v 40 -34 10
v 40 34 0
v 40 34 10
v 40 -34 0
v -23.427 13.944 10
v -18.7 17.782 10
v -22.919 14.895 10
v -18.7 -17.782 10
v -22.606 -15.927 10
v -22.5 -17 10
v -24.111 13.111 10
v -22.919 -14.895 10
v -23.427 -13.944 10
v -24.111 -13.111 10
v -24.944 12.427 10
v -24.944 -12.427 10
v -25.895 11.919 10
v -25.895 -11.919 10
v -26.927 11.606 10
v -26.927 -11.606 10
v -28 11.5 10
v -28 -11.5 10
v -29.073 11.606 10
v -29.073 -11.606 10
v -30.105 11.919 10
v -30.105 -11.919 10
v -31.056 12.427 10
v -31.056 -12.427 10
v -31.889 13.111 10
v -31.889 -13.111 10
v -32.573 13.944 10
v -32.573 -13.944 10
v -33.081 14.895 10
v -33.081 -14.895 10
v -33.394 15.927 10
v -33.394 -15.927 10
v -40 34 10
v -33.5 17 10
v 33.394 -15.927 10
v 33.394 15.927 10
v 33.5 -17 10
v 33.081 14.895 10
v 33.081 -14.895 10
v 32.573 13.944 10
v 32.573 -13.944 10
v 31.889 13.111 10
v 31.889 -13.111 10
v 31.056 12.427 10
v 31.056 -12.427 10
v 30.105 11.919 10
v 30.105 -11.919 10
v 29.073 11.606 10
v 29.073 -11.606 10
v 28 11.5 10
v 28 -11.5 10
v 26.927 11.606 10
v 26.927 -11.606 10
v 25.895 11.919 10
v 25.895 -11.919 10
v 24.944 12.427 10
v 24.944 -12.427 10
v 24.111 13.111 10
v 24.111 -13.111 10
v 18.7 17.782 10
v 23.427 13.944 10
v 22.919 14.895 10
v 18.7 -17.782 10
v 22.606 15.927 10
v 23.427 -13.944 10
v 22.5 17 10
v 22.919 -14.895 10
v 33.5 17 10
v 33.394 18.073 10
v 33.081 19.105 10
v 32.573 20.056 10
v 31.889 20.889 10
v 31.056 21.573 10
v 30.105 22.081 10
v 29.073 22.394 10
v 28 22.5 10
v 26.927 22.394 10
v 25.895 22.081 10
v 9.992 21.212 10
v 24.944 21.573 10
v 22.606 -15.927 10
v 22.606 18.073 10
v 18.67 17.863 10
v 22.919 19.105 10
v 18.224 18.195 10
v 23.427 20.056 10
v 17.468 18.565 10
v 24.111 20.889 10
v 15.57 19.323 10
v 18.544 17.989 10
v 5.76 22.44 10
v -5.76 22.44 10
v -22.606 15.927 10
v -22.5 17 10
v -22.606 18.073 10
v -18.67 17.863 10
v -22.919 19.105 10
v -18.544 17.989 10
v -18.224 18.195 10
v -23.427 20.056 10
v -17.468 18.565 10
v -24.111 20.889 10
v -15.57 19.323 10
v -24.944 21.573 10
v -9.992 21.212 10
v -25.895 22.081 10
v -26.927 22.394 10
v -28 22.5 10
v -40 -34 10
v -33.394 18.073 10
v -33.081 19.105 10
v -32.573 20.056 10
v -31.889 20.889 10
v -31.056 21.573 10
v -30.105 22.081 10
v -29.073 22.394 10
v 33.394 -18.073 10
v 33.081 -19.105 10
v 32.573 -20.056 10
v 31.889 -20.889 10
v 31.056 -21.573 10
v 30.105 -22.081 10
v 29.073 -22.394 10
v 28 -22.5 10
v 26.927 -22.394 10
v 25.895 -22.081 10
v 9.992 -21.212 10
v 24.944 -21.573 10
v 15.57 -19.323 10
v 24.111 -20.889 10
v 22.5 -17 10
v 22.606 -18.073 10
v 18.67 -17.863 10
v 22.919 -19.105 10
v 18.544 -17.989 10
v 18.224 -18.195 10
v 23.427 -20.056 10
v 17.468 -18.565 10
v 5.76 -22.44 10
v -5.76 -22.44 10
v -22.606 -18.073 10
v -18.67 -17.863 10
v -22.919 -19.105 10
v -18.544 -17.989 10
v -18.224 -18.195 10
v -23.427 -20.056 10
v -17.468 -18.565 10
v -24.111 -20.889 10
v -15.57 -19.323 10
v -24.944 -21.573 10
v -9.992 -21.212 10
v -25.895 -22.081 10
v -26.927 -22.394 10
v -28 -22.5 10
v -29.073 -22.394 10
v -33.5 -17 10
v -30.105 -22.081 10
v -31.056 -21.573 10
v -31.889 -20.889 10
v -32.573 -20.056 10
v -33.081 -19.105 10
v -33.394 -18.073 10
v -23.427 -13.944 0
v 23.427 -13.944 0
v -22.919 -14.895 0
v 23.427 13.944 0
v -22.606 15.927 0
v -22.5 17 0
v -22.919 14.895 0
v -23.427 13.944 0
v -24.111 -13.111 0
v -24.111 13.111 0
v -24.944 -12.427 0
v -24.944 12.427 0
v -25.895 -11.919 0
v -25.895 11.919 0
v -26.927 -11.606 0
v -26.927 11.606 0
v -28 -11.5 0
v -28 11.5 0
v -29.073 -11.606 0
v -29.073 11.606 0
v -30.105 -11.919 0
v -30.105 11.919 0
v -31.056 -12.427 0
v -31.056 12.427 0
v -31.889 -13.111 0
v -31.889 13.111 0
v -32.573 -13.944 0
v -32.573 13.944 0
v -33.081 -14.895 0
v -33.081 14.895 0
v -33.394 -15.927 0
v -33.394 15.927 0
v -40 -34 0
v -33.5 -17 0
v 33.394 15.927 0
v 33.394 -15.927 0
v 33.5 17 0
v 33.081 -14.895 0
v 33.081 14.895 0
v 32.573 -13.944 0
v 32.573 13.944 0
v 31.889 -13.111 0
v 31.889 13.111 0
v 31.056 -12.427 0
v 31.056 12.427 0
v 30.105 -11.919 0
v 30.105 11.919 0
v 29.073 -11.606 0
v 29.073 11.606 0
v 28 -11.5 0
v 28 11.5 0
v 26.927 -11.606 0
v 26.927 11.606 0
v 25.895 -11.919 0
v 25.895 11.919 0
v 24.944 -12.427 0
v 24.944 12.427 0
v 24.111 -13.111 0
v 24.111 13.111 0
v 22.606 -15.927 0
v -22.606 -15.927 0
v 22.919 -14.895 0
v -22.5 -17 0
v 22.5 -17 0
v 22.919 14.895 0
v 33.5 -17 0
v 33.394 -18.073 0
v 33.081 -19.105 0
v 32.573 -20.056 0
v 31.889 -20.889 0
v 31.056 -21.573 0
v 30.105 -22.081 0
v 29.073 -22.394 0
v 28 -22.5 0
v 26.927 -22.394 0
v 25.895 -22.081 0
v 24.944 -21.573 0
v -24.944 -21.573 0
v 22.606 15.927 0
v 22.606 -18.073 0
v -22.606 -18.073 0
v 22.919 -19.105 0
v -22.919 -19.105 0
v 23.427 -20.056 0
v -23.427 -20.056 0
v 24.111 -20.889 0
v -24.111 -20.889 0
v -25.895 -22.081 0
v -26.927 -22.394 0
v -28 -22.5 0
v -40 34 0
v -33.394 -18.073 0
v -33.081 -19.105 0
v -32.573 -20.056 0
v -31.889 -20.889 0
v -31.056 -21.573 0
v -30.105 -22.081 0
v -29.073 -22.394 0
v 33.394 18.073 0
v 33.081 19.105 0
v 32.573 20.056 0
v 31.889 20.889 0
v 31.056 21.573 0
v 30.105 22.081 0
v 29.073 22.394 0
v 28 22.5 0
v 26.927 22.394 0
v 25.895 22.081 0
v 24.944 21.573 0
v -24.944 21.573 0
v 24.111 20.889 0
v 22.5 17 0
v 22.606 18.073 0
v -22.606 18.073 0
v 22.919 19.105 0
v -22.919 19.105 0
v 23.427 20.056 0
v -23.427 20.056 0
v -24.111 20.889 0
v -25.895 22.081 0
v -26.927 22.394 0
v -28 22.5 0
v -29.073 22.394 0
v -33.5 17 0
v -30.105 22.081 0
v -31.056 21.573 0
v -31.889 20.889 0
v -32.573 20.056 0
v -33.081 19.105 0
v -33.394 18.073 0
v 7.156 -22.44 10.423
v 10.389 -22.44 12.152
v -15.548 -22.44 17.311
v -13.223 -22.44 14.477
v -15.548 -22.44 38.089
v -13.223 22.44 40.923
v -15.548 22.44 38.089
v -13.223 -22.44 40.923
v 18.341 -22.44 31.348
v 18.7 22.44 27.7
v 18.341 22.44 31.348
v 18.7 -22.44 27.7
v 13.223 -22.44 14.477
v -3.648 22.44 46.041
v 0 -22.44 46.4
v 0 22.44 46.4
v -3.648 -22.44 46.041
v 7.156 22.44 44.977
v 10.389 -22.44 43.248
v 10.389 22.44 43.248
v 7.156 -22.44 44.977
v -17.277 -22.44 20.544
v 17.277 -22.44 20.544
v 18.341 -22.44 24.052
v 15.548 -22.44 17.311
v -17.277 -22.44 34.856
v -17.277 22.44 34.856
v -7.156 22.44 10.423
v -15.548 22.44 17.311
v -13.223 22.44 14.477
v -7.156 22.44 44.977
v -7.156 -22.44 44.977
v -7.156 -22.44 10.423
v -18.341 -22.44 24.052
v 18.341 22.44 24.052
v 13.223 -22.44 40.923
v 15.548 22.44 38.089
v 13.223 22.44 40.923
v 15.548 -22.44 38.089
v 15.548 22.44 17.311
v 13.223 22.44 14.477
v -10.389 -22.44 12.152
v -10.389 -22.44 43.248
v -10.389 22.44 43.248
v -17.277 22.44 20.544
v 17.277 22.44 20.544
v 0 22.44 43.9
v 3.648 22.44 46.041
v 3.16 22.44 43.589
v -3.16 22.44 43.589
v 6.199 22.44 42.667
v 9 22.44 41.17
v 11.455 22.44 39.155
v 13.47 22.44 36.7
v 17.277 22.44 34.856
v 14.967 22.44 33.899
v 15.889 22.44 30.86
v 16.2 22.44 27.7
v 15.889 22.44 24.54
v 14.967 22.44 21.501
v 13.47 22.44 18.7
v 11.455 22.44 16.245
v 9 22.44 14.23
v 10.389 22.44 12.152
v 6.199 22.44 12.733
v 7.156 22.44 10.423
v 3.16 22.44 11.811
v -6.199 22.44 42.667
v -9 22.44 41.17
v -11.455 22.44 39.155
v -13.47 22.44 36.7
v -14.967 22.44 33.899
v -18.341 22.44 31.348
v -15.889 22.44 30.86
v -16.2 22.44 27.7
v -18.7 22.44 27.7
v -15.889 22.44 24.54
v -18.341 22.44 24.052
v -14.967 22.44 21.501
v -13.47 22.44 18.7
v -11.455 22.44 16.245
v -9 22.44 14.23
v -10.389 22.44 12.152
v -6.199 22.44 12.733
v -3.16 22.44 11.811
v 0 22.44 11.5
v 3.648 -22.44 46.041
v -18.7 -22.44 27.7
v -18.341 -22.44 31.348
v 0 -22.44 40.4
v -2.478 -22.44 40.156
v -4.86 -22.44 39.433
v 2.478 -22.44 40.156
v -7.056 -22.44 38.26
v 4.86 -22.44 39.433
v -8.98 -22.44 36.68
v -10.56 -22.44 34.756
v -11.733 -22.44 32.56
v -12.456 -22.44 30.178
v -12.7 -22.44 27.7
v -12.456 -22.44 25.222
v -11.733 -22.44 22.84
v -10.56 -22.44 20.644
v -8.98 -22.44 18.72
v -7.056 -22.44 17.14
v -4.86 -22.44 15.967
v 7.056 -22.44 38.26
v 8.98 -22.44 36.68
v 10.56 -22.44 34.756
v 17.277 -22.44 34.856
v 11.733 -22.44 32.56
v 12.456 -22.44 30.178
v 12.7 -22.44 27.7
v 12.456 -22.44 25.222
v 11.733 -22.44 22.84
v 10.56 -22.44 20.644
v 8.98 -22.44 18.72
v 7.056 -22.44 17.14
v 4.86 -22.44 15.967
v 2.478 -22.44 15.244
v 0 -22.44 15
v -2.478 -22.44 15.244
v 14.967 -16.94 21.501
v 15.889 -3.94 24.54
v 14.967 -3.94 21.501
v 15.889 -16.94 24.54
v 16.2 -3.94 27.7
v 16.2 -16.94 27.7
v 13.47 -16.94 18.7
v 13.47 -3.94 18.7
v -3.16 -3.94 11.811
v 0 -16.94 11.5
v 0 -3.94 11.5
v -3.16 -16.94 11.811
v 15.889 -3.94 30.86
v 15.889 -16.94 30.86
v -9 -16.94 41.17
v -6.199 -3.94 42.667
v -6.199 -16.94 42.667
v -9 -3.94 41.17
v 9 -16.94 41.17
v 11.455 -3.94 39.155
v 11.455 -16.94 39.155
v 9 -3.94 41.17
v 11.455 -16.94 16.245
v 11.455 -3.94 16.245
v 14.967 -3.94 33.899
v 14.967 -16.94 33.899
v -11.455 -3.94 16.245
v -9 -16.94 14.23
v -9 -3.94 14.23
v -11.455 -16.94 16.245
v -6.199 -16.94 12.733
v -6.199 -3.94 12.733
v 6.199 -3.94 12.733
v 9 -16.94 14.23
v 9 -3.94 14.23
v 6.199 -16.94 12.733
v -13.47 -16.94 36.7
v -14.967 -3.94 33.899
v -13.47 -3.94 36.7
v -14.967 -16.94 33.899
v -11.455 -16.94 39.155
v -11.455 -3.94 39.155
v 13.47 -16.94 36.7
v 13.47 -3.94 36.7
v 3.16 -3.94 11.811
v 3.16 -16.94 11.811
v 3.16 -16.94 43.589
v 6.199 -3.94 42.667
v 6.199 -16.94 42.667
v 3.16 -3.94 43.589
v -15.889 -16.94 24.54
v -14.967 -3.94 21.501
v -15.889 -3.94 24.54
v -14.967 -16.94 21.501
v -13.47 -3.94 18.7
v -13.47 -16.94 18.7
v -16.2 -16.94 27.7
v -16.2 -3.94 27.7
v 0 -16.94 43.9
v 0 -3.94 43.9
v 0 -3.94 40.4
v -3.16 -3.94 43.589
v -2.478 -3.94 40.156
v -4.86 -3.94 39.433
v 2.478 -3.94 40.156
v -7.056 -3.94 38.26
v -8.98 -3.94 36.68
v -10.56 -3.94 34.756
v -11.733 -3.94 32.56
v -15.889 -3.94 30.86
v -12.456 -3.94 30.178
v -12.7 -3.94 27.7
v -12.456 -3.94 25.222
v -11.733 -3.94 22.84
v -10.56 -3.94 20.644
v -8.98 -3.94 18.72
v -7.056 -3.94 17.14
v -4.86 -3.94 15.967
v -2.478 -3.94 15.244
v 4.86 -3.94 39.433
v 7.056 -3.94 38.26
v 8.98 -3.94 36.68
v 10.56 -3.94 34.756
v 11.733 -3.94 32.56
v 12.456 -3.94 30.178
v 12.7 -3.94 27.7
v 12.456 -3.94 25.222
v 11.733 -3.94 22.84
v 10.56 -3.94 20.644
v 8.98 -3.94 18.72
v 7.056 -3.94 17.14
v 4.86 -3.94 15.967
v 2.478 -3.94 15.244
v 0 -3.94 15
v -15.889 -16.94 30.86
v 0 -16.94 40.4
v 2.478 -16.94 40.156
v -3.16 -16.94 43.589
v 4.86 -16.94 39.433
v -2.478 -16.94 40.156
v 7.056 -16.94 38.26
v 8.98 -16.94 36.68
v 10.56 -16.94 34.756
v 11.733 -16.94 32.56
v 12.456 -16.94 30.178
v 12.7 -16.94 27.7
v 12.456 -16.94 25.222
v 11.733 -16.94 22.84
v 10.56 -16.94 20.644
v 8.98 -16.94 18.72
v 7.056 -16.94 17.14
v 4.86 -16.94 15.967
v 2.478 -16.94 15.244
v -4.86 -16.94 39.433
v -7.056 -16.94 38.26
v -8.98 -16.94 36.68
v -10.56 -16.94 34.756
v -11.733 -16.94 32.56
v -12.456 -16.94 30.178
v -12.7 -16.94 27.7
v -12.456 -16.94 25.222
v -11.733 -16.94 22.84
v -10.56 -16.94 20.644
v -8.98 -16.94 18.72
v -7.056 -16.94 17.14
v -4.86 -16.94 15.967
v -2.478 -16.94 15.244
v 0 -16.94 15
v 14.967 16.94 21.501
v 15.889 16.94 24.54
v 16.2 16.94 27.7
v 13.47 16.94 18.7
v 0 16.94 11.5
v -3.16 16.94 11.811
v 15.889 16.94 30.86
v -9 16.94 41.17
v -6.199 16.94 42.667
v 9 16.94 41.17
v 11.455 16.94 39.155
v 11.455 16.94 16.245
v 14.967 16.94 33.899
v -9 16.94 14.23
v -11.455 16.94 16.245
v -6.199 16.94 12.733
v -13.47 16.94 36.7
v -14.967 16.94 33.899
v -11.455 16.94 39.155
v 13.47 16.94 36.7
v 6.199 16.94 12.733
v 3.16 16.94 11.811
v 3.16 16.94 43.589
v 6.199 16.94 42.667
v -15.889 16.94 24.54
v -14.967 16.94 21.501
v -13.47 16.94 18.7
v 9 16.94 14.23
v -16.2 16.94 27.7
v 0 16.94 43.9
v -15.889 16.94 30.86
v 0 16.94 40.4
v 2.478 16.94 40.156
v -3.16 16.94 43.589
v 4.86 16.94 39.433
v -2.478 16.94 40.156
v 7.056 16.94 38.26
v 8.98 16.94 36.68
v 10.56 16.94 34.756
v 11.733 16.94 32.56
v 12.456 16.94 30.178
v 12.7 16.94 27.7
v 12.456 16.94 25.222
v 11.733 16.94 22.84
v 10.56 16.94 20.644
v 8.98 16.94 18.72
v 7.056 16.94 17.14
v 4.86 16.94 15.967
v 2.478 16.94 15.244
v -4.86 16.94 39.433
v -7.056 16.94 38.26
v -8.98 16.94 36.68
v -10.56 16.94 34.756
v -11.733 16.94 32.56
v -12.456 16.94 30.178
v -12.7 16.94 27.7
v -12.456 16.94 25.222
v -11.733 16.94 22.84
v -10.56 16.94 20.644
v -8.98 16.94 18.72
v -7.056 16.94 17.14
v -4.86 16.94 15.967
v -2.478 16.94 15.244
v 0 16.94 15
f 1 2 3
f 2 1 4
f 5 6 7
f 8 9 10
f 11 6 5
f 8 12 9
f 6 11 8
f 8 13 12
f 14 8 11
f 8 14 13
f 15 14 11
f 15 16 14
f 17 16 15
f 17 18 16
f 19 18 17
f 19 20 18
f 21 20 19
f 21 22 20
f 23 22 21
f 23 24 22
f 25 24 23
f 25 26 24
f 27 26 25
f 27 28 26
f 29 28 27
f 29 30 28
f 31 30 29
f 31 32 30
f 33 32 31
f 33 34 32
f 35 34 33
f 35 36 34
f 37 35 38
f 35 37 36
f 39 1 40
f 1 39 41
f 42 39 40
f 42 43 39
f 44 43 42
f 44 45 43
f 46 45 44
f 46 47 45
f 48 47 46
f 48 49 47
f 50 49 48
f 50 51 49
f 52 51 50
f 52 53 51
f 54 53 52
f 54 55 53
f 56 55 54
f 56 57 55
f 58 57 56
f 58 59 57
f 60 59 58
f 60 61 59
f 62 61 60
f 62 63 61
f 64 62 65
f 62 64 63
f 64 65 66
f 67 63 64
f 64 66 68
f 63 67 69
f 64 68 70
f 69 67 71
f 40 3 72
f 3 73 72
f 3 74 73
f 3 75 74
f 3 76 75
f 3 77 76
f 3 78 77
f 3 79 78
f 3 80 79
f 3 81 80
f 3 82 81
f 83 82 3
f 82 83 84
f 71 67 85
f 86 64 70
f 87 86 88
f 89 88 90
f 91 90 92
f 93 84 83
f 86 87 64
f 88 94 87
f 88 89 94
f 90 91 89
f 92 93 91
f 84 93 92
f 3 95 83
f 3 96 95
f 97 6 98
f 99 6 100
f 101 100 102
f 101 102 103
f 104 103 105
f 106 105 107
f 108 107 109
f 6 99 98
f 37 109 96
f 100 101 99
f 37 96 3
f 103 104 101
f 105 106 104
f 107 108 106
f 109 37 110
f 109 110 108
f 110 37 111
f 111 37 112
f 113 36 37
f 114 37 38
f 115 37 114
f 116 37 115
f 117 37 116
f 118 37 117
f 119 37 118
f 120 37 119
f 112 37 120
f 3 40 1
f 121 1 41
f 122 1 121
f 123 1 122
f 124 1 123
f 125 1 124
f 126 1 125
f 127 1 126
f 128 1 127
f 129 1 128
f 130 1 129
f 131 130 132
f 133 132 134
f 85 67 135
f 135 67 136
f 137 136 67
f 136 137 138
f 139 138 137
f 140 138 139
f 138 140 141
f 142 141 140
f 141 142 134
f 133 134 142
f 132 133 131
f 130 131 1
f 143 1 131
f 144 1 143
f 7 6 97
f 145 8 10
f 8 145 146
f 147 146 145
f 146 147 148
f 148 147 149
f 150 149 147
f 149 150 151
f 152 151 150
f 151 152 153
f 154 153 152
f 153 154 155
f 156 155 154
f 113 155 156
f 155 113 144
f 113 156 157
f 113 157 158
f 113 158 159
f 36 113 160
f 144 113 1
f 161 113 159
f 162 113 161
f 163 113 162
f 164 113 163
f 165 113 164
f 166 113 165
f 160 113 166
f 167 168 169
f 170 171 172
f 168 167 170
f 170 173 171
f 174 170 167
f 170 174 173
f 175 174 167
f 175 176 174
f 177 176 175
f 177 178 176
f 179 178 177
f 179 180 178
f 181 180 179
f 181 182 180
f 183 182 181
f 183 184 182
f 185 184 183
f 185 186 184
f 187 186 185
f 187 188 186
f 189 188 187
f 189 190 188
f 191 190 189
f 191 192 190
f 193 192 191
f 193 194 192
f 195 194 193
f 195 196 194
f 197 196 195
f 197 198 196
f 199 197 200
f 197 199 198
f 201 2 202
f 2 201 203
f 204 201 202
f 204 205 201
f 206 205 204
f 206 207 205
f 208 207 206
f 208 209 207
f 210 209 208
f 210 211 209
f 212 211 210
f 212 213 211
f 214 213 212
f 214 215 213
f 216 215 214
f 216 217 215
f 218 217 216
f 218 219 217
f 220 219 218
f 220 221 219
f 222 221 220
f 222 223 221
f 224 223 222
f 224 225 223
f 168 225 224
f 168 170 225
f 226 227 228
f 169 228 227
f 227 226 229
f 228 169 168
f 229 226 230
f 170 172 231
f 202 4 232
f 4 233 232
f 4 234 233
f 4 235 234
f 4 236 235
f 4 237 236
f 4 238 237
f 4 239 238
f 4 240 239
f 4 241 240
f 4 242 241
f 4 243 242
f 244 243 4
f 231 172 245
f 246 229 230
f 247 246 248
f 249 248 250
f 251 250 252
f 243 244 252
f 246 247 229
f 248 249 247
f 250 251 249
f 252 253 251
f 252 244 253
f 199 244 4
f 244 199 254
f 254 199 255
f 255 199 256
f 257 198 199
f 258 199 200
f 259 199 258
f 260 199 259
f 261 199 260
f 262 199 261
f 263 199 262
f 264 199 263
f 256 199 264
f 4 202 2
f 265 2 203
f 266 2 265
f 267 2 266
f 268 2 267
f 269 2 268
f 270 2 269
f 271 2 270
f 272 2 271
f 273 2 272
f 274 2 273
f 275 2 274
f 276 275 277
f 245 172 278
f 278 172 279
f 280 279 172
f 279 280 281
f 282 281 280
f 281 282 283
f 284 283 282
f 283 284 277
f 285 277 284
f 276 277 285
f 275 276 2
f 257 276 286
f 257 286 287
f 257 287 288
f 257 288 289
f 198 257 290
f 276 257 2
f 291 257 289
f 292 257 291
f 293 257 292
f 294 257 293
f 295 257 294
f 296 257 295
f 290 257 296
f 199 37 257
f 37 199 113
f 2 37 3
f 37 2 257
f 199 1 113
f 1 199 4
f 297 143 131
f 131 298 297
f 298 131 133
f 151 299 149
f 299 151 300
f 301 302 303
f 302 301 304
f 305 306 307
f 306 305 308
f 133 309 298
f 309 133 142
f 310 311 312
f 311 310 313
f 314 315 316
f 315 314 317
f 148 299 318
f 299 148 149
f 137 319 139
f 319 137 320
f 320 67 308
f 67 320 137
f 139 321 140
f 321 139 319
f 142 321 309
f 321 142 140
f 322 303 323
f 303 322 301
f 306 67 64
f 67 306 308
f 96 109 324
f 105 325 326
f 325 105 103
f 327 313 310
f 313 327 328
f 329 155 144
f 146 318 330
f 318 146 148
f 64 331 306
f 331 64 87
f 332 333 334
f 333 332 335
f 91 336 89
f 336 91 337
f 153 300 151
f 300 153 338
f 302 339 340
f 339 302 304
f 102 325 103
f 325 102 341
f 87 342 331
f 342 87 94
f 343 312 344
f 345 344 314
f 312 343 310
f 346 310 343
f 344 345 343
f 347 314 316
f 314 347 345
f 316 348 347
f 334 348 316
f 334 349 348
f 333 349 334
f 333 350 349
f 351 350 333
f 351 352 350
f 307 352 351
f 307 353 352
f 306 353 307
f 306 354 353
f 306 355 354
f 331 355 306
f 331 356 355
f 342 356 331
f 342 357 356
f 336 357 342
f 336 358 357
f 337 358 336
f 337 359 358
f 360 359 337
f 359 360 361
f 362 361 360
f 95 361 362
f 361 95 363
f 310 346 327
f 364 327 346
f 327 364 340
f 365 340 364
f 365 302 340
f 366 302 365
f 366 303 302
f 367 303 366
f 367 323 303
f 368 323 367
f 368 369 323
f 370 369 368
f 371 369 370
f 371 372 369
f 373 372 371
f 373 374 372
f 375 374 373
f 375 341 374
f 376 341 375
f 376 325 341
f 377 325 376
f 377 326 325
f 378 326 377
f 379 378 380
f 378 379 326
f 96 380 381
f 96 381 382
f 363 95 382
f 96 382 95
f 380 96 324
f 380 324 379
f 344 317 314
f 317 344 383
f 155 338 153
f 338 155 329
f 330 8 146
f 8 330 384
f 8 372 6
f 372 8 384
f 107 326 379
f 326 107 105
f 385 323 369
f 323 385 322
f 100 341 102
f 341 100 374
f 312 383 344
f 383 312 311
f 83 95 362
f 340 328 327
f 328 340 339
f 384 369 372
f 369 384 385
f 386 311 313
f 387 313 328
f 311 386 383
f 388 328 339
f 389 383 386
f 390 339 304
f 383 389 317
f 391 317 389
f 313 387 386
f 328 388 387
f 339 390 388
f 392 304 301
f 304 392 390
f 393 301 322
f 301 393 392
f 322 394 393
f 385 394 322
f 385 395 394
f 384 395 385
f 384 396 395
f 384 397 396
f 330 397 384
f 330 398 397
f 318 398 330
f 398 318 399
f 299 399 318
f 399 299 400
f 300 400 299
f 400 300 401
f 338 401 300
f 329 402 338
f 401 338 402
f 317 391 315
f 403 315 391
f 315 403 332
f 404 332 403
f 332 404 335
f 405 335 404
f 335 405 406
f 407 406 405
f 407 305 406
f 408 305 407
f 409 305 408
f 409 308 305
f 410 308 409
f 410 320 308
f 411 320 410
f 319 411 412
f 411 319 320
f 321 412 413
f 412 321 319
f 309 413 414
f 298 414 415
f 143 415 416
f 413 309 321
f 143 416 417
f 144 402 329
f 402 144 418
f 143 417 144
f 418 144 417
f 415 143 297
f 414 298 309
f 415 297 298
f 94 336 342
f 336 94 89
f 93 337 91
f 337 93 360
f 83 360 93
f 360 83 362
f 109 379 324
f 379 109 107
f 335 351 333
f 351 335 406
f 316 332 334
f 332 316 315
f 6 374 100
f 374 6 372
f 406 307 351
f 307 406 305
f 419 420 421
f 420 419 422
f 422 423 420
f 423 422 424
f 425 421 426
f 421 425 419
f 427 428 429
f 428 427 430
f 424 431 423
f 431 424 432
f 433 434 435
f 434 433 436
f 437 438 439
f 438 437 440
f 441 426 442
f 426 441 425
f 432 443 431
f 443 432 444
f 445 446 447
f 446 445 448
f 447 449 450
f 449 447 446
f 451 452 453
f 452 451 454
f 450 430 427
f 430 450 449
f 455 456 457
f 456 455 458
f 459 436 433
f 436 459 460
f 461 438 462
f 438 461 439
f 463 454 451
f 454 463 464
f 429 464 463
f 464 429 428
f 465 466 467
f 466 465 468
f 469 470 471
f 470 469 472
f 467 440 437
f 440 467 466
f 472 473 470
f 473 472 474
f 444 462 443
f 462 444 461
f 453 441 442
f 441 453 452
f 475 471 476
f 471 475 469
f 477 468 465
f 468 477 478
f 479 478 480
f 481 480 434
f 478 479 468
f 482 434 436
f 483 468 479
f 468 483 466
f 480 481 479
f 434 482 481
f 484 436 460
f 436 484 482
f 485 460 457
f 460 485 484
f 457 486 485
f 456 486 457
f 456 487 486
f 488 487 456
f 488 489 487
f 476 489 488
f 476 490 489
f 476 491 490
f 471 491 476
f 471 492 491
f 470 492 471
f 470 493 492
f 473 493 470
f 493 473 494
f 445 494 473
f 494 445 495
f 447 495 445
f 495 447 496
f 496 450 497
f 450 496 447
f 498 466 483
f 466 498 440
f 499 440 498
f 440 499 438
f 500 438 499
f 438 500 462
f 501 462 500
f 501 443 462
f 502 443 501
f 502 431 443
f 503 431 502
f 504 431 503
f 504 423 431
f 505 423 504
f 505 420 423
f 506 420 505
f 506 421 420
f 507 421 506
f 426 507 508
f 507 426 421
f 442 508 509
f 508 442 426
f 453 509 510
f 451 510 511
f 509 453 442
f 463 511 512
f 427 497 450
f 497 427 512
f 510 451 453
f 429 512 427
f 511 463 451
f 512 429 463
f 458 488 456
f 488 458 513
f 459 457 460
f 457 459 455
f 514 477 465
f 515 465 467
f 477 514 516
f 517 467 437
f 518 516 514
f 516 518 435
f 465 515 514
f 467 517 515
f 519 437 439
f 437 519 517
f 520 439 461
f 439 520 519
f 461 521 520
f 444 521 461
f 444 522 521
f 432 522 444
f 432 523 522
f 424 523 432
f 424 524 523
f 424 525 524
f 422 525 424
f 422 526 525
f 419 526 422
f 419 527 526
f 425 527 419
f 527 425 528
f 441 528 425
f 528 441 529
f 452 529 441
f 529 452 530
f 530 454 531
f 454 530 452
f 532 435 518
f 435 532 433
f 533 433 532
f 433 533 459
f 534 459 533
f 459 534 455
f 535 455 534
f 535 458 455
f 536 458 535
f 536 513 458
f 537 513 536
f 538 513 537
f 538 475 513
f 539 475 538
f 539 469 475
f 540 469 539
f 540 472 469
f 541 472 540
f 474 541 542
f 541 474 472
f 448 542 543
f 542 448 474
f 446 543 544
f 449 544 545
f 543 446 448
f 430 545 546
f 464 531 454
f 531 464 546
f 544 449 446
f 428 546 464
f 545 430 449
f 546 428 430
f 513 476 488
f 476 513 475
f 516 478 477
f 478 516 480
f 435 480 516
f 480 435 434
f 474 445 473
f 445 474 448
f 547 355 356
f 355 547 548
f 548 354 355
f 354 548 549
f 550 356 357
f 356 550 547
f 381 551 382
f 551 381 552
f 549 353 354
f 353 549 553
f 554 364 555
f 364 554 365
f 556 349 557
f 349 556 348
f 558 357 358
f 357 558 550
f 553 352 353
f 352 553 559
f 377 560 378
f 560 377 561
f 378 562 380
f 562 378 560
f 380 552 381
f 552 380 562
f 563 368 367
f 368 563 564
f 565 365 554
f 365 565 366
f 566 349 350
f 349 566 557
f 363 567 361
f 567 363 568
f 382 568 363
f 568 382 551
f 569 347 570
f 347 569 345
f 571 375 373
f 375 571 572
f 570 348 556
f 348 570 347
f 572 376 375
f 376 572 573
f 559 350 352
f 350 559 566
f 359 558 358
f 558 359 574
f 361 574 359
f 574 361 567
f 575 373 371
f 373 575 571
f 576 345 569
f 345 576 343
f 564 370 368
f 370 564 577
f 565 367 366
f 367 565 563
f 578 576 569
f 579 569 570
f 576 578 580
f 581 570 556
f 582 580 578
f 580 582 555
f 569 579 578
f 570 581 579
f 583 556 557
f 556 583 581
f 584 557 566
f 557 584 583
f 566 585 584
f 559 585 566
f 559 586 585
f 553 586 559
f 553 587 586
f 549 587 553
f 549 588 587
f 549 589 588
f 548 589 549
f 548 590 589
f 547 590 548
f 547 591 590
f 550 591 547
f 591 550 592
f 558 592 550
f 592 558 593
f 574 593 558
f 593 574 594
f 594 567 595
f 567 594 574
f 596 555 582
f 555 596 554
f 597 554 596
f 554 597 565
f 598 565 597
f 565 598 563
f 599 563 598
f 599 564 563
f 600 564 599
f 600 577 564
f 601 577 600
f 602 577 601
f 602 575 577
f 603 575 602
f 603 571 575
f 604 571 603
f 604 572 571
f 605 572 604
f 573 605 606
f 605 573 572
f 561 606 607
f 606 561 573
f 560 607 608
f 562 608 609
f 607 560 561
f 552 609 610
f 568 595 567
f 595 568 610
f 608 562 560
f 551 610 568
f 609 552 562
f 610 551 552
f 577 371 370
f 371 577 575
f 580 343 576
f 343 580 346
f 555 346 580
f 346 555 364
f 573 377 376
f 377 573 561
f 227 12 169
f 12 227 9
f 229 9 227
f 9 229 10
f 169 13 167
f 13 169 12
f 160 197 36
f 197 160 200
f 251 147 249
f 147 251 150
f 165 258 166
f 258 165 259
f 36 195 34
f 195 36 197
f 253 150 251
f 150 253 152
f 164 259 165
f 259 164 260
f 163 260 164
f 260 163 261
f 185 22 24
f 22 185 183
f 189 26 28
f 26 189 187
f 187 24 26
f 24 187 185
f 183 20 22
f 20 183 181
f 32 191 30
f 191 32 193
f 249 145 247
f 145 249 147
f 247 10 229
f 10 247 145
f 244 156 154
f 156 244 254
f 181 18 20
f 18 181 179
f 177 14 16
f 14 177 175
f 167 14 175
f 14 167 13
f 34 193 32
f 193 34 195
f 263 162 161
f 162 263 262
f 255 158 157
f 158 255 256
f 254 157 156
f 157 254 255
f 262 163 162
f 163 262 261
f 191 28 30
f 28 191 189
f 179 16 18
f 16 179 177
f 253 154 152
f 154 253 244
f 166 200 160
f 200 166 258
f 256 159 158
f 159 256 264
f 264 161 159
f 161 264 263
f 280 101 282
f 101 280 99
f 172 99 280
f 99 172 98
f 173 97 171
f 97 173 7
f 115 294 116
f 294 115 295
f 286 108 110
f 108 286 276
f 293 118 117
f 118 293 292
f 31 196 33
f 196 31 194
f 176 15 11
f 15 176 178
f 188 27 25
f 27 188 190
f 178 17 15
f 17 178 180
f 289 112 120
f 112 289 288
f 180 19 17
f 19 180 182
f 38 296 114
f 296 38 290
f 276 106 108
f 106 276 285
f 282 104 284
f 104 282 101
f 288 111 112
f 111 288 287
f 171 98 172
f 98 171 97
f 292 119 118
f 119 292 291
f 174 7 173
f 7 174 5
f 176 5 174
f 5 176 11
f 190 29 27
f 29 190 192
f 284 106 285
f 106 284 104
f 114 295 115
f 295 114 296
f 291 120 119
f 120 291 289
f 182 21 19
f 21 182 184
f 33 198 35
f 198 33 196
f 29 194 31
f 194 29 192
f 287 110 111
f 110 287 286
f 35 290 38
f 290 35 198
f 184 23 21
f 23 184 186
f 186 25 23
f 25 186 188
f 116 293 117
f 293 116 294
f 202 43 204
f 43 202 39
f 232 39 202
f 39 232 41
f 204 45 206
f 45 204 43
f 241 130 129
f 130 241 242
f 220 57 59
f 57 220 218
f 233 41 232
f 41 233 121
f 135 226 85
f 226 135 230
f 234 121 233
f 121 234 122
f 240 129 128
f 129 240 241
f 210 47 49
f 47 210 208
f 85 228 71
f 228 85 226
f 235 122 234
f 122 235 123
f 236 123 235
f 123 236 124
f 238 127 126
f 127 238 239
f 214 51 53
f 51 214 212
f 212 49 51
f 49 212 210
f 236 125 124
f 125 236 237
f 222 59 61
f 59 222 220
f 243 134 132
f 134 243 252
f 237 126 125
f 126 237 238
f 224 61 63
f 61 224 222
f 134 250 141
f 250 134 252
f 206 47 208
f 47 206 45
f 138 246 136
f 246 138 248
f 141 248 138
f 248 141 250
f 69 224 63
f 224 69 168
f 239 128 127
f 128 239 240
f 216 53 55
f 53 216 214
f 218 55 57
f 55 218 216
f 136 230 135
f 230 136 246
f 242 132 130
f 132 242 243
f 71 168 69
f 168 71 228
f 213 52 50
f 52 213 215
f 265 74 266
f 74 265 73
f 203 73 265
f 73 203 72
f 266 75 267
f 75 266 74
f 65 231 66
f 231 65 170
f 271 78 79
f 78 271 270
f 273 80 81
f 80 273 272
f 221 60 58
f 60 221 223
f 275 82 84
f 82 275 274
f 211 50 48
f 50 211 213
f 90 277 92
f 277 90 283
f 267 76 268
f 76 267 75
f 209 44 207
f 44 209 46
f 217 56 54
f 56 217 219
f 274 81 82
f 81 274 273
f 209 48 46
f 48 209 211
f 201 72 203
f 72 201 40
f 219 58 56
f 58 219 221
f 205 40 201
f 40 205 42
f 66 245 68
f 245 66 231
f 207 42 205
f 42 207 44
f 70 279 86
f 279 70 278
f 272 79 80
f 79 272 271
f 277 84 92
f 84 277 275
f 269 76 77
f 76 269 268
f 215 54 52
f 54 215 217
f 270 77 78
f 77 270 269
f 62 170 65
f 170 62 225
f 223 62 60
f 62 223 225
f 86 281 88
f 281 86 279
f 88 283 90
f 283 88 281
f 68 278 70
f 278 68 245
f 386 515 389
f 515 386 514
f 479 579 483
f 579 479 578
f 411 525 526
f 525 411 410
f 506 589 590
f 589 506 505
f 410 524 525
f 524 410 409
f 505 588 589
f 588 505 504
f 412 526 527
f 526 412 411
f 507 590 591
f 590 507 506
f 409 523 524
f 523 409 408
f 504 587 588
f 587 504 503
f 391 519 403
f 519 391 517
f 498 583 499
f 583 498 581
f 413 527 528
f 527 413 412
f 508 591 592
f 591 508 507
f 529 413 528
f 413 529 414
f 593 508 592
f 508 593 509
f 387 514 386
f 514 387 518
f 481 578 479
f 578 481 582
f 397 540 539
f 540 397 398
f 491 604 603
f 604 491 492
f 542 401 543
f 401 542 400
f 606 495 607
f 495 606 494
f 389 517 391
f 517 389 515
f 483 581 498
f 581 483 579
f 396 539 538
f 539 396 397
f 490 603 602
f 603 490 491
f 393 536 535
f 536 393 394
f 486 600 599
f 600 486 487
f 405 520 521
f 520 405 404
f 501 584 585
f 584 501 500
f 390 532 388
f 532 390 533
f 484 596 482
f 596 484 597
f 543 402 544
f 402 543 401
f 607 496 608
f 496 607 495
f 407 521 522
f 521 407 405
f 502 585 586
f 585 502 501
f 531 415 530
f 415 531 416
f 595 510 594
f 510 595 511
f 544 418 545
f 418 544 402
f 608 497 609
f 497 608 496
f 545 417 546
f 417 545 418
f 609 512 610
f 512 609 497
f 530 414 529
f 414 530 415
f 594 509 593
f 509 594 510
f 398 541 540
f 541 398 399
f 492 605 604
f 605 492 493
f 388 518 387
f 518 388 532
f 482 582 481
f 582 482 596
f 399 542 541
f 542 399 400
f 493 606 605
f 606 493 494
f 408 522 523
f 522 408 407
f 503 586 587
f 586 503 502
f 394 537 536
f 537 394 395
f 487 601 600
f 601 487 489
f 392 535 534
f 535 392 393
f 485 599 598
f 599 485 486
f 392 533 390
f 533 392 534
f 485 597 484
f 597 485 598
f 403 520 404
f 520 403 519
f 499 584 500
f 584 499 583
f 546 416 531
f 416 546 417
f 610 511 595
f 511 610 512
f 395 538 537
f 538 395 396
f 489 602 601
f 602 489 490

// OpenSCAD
$fn = 32;

// ----------------------------------------------------------------------
// Bearing block: 80 x 68 mm base, 25.4 mm bore at 27.7 mm
// ----------------------------------------------------------------------

// --- parameters (mm) ---
base_w = 80;              // base width
base_d = 68;              // base depth
base_t = 10;              // base thickness
bore_d = 25.4;            // shaft / bearing bore
house_r = 18.7;           // housing outer radius
house_len = 44.88;        // housing length along the shaft
foot_w = 37.4;            // foot width under the housing
foot_len = 34.88;         // foot length along the shaft
axis_z = 27.7;            // bore axis height above the base
holes_d = 11;             // mounting holes
hole_x = 28;              // mounting hole spacing
seat_d = 8;               // bearing seat depth
seat_wall = 3.5;          // seat wall thickness

difference() {
  union() {
    /* base plate with its underside on z = 0 */
    translate([0, 0, base_t / 2]) cube([base_w, base_d, base_t], center = true);
    /* hull foot: a straight web blending into the round housing */
    hull() {
      translate([0, 0, base_t - 0.5]) cube([foot_w, foot_len, 1.6], center = true);
      translate([0, 0, axis_z]) rotate([-90, 0, 0]) cylinder(h = house_len, d = 2 * house_r, center = true);
    }
  }
  /* bore through the housing, 2.5 mm clear on both sides */
  translate([0, 0, axis_z]) rotate([-90, 0, 0]) cylinder(h = house_len + 5, d = bore_d, center = true);
  /* bearing seats, recessed into both ends of the housing */
  for (sy = [-1, 1]) {
    translate([0, sy * (house_len / 2 - seat_d + 2.5), axis_z]) rotate([-90, 0, 0]) cylinder(h = seat_d + 5, d = bore_d + 2 * seat_wall);
  }
  /* mounting holes through the base plate */
  for (hx = [-28, 28]) {
    for (hy = [-17, 17]) {
      translate([hx, hy, -2.5]) cylinder(h = base_t + 5, d = holes_d);
    }
  }
}
